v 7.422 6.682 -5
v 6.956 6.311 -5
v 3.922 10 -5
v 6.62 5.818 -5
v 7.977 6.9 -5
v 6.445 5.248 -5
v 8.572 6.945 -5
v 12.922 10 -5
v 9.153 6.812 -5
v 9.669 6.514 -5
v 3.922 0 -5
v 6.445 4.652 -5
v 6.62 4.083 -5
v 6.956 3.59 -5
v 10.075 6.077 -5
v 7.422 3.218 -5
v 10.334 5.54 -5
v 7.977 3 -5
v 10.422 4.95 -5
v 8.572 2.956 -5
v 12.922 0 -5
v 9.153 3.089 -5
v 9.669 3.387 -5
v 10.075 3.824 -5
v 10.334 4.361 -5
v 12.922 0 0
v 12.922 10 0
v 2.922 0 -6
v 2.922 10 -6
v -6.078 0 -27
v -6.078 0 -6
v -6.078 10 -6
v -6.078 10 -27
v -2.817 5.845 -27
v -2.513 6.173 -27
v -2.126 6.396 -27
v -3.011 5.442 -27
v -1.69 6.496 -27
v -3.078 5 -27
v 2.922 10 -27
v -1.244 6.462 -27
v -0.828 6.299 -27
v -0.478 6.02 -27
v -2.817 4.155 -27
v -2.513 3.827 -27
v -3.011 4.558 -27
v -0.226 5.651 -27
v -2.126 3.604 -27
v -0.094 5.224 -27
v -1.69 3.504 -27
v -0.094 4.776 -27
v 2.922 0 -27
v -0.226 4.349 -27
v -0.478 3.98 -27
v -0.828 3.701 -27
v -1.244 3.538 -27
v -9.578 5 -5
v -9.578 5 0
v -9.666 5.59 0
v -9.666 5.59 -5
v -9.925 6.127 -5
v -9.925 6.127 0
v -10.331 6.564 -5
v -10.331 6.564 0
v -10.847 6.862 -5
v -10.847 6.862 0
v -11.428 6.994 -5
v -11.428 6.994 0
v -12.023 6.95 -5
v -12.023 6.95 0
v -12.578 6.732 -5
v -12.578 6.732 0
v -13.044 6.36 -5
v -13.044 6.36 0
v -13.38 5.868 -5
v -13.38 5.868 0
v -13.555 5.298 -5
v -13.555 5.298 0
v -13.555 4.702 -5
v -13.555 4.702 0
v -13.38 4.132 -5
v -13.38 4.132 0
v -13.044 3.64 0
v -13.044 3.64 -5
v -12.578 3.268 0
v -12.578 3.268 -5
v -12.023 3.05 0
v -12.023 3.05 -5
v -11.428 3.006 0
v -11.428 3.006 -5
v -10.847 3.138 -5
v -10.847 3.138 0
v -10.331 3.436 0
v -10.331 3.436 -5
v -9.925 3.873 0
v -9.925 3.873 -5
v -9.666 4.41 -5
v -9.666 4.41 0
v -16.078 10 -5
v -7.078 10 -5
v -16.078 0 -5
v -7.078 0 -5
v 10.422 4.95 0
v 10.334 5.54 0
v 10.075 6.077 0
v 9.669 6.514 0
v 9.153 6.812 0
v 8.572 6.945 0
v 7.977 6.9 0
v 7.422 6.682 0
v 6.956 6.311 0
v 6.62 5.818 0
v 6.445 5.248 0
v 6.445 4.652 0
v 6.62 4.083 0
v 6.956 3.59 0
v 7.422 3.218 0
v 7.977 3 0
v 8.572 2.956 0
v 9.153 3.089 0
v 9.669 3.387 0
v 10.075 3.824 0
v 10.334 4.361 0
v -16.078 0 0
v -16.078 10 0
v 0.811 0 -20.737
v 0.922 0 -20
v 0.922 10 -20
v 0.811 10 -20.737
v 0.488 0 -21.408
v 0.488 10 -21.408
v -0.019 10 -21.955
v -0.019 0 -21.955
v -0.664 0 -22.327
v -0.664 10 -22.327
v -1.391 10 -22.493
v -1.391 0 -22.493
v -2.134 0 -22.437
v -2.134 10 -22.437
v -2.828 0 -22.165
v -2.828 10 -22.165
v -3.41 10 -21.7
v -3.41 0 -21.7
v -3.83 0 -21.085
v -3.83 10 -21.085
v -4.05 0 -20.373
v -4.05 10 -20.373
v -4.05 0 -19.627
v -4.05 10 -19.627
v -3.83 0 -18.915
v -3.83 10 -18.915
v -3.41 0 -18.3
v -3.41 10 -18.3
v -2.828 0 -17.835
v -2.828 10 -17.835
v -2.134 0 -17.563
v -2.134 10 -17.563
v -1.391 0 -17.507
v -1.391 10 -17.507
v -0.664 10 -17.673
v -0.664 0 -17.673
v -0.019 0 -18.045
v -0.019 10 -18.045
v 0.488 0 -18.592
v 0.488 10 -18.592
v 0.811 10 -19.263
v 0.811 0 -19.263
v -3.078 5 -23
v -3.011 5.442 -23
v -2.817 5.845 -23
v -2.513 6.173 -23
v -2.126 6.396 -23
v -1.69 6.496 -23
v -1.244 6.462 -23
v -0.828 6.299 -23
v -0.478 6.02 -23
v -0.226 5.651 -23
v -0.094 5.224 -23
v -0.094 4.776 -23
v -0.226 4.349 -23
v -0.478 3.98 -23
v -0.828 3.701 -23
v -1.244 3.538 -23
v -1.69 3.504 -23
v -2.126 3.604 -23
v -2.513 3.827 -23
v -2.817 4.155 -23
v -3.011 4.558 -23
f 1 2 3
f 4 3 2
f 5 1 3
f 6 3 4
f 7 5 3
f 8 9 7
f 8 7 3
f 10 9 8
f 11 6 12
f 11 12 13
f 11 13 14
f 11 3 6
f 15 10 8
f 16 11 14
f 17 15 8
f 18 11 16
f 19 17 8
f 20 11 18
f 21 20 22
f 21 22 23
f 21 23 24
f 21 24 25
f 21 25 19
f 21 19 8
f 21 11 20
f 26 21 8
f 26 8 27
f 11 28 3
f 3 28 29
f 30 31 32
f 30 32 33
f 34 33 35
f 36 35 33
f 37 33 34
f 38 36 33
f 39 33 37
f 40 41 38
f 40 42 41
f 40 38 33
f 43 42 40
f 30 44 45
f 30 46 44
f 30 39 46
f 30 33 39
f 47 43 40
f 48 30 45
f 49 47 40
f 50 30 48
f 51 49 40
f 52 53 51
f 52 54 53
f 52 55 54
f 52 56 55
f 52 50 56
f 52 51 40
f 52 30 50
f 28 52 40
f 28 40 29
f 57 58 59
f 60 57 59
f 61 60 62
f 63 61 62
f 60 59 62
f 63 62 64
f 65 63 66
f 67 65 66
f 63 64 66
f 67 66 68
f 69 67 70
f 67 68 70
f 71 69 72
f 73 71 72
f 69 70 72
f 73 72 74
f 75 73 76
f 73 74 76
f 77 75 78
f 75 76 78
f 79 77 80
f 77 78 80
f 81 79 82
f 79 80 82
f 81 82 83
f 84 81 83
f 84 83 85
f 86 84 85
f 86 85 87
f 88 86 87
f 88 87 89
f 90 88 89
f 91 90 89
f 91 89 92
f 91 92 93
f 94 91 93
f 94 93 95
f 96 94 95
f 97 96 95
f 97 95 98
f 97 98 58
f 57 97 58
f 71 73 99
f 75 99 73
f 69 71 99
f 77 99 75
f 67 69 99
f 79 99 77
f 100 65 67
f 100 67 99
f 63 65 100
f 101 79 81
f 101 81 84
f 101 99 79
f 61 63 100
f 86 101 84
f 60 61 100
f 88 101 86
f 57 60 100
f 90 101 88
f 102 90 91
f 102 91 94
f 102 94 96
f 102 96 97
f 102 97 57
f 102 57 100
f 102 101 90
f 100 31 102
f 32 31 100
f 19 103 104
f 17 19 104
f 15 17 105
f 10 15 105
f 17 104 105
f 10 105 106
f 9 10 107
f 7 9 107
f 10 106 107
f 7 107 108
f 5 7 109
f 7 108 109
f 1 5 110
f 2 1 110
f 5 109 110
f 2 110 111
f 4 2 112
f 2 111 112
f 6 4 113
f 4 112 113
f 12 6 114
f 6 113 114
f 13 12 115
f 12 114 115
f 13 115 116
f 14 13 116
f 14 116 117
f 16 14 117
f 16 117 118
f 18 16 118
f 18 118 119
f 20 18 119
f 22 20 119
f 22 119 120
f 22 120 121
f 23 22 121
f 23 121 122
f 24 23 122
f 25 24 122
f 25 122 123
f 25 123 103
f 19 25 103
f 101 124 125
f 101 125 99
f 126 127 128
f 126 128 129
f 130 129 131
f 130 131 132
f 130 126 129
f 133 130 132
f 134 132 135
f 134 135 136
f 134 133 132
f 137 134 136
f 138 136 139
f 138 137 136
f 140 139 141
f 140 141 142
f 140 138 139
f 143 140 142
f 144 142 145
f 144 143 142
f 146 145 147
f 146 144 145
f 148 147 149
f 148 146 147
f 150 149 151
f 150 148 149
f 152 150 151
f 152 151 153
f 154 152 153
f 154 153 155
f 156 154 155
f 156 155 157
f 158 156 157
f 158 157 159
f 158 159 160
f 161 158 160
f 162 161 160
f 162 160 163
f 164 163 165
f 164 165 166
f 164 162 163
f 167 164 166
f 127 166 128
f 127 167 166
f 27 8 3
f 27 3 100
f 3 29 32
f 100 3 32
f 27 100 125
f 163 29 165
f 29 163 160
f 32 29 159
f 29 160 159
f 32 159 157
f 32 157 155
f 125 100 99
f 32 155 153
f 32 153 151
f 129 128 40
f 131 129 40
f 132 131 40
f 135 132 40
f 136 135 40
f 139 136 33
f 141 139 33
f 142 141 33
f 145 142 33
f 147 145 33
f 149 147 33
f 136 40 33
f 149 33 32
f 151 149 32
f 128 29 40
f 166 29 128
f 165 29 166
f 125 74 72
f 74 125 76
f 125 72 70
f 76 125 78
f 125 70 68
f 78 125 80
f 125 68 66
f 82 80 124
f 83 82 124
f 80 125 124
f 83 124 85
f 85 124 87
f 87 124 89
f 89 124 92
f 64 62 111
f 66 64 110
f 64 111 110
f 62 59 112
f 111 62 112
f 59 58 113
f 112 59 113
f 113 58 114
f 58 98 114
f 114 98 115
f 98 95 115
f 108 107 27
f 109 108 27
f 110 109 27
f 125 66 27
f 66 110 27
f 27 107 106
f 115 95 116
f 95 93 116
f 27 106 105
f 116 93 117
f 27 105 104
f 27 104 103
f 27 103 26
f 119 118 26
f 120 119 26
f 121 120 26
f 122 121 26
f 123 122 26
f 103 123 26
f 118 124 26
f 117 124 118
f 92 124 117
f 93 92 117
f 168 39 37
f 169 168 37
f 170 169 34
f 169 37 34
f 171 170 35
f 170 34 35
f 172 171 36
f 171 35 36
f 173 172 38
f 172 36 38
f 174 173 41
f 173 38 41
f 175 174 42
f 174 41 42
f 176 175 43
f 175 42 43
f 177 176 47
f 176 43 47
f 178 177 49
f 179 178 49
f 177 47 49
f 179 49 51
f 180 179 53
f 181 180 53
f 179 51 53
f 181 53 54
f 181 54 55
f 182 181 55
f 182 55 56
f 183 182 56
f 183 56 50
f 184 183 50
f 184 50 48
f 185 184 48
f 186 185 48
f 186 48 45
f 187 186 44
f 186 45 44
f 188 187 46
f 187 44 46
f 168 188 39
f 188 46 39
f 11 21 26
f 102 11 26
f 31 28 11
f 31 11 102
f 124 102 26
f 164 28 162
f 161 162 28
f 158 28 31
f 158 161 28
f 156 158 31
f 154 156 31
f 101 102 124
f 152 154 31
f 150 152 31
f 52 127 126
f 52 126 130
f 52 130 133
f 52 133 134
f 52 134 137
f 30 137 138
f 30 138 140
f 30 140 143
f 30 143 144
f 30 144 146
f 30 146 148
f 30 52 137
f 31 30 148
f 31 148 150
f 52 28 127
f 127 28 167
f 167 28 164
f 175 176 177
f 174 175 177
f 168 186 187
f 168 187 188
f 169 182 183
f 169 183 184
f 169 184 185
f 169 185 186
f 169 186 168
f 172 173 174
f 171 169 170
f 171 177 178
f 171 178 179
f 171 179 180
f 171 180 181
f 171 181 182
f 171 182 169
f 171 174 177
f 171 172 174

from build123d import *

# Parameters (mm, degrees)
SKETCH1_R           = 2.5
BOSS_EXTRUDE1_DEPTH = 10
SKETCH2_R           = 2
CUT_EXTRUDE1_DEPTH  = 10
SKETCH3_R           = 1.5
CUT_EXTRUDE2_DEPTH  = 4
CHAMFER1_SIZE       = 1


with BuildPart() as part:
    # Sketch1 → Boss-Extrude1 (new body)
    with BuildSketch(Plane(origin=(0, 0, 0), x_dir=(1, 0, 0), z_dir=(0, 1, 0))):
        Polygon((-1.577591036, 0), (-16.077591036, 0), (-16.077591036, 5), (-6.077591036, 5), (-6.077591036, 27), (2.922408964, 27), (2.922408964, 5), (12.922408964, 5), (12.922408964, 0), align=None)
        with Locations((-1.577591036, 20)):
            Circle(SKETCH1_R, mode=Mode.SUBTRACT)
    extrude(amount=BOSS_EXTRUDE1_DEPTH)

    # Sketch2 → Cut-Extrude1 (cut)
    with BuildSketch(Plane.XY):
        with Locations((-11.577591036, 5)):
            Circle(SKETCH2_R)
        with Locations((8.422408964, 4.9503422)):
            Circle(SKETCH2_R)
    extrude(amount=-CUT_EXTRUDE1_DEPTH, mode=Mode.SUBTRACT)

    # Sketch3 → Cut-Extrude2 (cut)
    with BuildSketch(Plane(origin=(0, 0, -27), x_dir=(-1, 0, 0), z_dir=(0, 0, -1))):
        with Locations((1.577591036, 5)):
            Circle(SKETCH3_R)
    extrude(amount=-CUT_EXTRUDE2_DEPTH, mode=Mode.SUBTRACT)

    # Chamfer1
    chamfer1_edges = [part.edges().sort_by_distance(p)[0] for p in [
        (-6.077591036, 5, -5),
        (2.922408964, 5, -5),
    ]]
    chamfer(chamfer1_edges, length=CHAMFER1_SIZE)


solid = part.part
